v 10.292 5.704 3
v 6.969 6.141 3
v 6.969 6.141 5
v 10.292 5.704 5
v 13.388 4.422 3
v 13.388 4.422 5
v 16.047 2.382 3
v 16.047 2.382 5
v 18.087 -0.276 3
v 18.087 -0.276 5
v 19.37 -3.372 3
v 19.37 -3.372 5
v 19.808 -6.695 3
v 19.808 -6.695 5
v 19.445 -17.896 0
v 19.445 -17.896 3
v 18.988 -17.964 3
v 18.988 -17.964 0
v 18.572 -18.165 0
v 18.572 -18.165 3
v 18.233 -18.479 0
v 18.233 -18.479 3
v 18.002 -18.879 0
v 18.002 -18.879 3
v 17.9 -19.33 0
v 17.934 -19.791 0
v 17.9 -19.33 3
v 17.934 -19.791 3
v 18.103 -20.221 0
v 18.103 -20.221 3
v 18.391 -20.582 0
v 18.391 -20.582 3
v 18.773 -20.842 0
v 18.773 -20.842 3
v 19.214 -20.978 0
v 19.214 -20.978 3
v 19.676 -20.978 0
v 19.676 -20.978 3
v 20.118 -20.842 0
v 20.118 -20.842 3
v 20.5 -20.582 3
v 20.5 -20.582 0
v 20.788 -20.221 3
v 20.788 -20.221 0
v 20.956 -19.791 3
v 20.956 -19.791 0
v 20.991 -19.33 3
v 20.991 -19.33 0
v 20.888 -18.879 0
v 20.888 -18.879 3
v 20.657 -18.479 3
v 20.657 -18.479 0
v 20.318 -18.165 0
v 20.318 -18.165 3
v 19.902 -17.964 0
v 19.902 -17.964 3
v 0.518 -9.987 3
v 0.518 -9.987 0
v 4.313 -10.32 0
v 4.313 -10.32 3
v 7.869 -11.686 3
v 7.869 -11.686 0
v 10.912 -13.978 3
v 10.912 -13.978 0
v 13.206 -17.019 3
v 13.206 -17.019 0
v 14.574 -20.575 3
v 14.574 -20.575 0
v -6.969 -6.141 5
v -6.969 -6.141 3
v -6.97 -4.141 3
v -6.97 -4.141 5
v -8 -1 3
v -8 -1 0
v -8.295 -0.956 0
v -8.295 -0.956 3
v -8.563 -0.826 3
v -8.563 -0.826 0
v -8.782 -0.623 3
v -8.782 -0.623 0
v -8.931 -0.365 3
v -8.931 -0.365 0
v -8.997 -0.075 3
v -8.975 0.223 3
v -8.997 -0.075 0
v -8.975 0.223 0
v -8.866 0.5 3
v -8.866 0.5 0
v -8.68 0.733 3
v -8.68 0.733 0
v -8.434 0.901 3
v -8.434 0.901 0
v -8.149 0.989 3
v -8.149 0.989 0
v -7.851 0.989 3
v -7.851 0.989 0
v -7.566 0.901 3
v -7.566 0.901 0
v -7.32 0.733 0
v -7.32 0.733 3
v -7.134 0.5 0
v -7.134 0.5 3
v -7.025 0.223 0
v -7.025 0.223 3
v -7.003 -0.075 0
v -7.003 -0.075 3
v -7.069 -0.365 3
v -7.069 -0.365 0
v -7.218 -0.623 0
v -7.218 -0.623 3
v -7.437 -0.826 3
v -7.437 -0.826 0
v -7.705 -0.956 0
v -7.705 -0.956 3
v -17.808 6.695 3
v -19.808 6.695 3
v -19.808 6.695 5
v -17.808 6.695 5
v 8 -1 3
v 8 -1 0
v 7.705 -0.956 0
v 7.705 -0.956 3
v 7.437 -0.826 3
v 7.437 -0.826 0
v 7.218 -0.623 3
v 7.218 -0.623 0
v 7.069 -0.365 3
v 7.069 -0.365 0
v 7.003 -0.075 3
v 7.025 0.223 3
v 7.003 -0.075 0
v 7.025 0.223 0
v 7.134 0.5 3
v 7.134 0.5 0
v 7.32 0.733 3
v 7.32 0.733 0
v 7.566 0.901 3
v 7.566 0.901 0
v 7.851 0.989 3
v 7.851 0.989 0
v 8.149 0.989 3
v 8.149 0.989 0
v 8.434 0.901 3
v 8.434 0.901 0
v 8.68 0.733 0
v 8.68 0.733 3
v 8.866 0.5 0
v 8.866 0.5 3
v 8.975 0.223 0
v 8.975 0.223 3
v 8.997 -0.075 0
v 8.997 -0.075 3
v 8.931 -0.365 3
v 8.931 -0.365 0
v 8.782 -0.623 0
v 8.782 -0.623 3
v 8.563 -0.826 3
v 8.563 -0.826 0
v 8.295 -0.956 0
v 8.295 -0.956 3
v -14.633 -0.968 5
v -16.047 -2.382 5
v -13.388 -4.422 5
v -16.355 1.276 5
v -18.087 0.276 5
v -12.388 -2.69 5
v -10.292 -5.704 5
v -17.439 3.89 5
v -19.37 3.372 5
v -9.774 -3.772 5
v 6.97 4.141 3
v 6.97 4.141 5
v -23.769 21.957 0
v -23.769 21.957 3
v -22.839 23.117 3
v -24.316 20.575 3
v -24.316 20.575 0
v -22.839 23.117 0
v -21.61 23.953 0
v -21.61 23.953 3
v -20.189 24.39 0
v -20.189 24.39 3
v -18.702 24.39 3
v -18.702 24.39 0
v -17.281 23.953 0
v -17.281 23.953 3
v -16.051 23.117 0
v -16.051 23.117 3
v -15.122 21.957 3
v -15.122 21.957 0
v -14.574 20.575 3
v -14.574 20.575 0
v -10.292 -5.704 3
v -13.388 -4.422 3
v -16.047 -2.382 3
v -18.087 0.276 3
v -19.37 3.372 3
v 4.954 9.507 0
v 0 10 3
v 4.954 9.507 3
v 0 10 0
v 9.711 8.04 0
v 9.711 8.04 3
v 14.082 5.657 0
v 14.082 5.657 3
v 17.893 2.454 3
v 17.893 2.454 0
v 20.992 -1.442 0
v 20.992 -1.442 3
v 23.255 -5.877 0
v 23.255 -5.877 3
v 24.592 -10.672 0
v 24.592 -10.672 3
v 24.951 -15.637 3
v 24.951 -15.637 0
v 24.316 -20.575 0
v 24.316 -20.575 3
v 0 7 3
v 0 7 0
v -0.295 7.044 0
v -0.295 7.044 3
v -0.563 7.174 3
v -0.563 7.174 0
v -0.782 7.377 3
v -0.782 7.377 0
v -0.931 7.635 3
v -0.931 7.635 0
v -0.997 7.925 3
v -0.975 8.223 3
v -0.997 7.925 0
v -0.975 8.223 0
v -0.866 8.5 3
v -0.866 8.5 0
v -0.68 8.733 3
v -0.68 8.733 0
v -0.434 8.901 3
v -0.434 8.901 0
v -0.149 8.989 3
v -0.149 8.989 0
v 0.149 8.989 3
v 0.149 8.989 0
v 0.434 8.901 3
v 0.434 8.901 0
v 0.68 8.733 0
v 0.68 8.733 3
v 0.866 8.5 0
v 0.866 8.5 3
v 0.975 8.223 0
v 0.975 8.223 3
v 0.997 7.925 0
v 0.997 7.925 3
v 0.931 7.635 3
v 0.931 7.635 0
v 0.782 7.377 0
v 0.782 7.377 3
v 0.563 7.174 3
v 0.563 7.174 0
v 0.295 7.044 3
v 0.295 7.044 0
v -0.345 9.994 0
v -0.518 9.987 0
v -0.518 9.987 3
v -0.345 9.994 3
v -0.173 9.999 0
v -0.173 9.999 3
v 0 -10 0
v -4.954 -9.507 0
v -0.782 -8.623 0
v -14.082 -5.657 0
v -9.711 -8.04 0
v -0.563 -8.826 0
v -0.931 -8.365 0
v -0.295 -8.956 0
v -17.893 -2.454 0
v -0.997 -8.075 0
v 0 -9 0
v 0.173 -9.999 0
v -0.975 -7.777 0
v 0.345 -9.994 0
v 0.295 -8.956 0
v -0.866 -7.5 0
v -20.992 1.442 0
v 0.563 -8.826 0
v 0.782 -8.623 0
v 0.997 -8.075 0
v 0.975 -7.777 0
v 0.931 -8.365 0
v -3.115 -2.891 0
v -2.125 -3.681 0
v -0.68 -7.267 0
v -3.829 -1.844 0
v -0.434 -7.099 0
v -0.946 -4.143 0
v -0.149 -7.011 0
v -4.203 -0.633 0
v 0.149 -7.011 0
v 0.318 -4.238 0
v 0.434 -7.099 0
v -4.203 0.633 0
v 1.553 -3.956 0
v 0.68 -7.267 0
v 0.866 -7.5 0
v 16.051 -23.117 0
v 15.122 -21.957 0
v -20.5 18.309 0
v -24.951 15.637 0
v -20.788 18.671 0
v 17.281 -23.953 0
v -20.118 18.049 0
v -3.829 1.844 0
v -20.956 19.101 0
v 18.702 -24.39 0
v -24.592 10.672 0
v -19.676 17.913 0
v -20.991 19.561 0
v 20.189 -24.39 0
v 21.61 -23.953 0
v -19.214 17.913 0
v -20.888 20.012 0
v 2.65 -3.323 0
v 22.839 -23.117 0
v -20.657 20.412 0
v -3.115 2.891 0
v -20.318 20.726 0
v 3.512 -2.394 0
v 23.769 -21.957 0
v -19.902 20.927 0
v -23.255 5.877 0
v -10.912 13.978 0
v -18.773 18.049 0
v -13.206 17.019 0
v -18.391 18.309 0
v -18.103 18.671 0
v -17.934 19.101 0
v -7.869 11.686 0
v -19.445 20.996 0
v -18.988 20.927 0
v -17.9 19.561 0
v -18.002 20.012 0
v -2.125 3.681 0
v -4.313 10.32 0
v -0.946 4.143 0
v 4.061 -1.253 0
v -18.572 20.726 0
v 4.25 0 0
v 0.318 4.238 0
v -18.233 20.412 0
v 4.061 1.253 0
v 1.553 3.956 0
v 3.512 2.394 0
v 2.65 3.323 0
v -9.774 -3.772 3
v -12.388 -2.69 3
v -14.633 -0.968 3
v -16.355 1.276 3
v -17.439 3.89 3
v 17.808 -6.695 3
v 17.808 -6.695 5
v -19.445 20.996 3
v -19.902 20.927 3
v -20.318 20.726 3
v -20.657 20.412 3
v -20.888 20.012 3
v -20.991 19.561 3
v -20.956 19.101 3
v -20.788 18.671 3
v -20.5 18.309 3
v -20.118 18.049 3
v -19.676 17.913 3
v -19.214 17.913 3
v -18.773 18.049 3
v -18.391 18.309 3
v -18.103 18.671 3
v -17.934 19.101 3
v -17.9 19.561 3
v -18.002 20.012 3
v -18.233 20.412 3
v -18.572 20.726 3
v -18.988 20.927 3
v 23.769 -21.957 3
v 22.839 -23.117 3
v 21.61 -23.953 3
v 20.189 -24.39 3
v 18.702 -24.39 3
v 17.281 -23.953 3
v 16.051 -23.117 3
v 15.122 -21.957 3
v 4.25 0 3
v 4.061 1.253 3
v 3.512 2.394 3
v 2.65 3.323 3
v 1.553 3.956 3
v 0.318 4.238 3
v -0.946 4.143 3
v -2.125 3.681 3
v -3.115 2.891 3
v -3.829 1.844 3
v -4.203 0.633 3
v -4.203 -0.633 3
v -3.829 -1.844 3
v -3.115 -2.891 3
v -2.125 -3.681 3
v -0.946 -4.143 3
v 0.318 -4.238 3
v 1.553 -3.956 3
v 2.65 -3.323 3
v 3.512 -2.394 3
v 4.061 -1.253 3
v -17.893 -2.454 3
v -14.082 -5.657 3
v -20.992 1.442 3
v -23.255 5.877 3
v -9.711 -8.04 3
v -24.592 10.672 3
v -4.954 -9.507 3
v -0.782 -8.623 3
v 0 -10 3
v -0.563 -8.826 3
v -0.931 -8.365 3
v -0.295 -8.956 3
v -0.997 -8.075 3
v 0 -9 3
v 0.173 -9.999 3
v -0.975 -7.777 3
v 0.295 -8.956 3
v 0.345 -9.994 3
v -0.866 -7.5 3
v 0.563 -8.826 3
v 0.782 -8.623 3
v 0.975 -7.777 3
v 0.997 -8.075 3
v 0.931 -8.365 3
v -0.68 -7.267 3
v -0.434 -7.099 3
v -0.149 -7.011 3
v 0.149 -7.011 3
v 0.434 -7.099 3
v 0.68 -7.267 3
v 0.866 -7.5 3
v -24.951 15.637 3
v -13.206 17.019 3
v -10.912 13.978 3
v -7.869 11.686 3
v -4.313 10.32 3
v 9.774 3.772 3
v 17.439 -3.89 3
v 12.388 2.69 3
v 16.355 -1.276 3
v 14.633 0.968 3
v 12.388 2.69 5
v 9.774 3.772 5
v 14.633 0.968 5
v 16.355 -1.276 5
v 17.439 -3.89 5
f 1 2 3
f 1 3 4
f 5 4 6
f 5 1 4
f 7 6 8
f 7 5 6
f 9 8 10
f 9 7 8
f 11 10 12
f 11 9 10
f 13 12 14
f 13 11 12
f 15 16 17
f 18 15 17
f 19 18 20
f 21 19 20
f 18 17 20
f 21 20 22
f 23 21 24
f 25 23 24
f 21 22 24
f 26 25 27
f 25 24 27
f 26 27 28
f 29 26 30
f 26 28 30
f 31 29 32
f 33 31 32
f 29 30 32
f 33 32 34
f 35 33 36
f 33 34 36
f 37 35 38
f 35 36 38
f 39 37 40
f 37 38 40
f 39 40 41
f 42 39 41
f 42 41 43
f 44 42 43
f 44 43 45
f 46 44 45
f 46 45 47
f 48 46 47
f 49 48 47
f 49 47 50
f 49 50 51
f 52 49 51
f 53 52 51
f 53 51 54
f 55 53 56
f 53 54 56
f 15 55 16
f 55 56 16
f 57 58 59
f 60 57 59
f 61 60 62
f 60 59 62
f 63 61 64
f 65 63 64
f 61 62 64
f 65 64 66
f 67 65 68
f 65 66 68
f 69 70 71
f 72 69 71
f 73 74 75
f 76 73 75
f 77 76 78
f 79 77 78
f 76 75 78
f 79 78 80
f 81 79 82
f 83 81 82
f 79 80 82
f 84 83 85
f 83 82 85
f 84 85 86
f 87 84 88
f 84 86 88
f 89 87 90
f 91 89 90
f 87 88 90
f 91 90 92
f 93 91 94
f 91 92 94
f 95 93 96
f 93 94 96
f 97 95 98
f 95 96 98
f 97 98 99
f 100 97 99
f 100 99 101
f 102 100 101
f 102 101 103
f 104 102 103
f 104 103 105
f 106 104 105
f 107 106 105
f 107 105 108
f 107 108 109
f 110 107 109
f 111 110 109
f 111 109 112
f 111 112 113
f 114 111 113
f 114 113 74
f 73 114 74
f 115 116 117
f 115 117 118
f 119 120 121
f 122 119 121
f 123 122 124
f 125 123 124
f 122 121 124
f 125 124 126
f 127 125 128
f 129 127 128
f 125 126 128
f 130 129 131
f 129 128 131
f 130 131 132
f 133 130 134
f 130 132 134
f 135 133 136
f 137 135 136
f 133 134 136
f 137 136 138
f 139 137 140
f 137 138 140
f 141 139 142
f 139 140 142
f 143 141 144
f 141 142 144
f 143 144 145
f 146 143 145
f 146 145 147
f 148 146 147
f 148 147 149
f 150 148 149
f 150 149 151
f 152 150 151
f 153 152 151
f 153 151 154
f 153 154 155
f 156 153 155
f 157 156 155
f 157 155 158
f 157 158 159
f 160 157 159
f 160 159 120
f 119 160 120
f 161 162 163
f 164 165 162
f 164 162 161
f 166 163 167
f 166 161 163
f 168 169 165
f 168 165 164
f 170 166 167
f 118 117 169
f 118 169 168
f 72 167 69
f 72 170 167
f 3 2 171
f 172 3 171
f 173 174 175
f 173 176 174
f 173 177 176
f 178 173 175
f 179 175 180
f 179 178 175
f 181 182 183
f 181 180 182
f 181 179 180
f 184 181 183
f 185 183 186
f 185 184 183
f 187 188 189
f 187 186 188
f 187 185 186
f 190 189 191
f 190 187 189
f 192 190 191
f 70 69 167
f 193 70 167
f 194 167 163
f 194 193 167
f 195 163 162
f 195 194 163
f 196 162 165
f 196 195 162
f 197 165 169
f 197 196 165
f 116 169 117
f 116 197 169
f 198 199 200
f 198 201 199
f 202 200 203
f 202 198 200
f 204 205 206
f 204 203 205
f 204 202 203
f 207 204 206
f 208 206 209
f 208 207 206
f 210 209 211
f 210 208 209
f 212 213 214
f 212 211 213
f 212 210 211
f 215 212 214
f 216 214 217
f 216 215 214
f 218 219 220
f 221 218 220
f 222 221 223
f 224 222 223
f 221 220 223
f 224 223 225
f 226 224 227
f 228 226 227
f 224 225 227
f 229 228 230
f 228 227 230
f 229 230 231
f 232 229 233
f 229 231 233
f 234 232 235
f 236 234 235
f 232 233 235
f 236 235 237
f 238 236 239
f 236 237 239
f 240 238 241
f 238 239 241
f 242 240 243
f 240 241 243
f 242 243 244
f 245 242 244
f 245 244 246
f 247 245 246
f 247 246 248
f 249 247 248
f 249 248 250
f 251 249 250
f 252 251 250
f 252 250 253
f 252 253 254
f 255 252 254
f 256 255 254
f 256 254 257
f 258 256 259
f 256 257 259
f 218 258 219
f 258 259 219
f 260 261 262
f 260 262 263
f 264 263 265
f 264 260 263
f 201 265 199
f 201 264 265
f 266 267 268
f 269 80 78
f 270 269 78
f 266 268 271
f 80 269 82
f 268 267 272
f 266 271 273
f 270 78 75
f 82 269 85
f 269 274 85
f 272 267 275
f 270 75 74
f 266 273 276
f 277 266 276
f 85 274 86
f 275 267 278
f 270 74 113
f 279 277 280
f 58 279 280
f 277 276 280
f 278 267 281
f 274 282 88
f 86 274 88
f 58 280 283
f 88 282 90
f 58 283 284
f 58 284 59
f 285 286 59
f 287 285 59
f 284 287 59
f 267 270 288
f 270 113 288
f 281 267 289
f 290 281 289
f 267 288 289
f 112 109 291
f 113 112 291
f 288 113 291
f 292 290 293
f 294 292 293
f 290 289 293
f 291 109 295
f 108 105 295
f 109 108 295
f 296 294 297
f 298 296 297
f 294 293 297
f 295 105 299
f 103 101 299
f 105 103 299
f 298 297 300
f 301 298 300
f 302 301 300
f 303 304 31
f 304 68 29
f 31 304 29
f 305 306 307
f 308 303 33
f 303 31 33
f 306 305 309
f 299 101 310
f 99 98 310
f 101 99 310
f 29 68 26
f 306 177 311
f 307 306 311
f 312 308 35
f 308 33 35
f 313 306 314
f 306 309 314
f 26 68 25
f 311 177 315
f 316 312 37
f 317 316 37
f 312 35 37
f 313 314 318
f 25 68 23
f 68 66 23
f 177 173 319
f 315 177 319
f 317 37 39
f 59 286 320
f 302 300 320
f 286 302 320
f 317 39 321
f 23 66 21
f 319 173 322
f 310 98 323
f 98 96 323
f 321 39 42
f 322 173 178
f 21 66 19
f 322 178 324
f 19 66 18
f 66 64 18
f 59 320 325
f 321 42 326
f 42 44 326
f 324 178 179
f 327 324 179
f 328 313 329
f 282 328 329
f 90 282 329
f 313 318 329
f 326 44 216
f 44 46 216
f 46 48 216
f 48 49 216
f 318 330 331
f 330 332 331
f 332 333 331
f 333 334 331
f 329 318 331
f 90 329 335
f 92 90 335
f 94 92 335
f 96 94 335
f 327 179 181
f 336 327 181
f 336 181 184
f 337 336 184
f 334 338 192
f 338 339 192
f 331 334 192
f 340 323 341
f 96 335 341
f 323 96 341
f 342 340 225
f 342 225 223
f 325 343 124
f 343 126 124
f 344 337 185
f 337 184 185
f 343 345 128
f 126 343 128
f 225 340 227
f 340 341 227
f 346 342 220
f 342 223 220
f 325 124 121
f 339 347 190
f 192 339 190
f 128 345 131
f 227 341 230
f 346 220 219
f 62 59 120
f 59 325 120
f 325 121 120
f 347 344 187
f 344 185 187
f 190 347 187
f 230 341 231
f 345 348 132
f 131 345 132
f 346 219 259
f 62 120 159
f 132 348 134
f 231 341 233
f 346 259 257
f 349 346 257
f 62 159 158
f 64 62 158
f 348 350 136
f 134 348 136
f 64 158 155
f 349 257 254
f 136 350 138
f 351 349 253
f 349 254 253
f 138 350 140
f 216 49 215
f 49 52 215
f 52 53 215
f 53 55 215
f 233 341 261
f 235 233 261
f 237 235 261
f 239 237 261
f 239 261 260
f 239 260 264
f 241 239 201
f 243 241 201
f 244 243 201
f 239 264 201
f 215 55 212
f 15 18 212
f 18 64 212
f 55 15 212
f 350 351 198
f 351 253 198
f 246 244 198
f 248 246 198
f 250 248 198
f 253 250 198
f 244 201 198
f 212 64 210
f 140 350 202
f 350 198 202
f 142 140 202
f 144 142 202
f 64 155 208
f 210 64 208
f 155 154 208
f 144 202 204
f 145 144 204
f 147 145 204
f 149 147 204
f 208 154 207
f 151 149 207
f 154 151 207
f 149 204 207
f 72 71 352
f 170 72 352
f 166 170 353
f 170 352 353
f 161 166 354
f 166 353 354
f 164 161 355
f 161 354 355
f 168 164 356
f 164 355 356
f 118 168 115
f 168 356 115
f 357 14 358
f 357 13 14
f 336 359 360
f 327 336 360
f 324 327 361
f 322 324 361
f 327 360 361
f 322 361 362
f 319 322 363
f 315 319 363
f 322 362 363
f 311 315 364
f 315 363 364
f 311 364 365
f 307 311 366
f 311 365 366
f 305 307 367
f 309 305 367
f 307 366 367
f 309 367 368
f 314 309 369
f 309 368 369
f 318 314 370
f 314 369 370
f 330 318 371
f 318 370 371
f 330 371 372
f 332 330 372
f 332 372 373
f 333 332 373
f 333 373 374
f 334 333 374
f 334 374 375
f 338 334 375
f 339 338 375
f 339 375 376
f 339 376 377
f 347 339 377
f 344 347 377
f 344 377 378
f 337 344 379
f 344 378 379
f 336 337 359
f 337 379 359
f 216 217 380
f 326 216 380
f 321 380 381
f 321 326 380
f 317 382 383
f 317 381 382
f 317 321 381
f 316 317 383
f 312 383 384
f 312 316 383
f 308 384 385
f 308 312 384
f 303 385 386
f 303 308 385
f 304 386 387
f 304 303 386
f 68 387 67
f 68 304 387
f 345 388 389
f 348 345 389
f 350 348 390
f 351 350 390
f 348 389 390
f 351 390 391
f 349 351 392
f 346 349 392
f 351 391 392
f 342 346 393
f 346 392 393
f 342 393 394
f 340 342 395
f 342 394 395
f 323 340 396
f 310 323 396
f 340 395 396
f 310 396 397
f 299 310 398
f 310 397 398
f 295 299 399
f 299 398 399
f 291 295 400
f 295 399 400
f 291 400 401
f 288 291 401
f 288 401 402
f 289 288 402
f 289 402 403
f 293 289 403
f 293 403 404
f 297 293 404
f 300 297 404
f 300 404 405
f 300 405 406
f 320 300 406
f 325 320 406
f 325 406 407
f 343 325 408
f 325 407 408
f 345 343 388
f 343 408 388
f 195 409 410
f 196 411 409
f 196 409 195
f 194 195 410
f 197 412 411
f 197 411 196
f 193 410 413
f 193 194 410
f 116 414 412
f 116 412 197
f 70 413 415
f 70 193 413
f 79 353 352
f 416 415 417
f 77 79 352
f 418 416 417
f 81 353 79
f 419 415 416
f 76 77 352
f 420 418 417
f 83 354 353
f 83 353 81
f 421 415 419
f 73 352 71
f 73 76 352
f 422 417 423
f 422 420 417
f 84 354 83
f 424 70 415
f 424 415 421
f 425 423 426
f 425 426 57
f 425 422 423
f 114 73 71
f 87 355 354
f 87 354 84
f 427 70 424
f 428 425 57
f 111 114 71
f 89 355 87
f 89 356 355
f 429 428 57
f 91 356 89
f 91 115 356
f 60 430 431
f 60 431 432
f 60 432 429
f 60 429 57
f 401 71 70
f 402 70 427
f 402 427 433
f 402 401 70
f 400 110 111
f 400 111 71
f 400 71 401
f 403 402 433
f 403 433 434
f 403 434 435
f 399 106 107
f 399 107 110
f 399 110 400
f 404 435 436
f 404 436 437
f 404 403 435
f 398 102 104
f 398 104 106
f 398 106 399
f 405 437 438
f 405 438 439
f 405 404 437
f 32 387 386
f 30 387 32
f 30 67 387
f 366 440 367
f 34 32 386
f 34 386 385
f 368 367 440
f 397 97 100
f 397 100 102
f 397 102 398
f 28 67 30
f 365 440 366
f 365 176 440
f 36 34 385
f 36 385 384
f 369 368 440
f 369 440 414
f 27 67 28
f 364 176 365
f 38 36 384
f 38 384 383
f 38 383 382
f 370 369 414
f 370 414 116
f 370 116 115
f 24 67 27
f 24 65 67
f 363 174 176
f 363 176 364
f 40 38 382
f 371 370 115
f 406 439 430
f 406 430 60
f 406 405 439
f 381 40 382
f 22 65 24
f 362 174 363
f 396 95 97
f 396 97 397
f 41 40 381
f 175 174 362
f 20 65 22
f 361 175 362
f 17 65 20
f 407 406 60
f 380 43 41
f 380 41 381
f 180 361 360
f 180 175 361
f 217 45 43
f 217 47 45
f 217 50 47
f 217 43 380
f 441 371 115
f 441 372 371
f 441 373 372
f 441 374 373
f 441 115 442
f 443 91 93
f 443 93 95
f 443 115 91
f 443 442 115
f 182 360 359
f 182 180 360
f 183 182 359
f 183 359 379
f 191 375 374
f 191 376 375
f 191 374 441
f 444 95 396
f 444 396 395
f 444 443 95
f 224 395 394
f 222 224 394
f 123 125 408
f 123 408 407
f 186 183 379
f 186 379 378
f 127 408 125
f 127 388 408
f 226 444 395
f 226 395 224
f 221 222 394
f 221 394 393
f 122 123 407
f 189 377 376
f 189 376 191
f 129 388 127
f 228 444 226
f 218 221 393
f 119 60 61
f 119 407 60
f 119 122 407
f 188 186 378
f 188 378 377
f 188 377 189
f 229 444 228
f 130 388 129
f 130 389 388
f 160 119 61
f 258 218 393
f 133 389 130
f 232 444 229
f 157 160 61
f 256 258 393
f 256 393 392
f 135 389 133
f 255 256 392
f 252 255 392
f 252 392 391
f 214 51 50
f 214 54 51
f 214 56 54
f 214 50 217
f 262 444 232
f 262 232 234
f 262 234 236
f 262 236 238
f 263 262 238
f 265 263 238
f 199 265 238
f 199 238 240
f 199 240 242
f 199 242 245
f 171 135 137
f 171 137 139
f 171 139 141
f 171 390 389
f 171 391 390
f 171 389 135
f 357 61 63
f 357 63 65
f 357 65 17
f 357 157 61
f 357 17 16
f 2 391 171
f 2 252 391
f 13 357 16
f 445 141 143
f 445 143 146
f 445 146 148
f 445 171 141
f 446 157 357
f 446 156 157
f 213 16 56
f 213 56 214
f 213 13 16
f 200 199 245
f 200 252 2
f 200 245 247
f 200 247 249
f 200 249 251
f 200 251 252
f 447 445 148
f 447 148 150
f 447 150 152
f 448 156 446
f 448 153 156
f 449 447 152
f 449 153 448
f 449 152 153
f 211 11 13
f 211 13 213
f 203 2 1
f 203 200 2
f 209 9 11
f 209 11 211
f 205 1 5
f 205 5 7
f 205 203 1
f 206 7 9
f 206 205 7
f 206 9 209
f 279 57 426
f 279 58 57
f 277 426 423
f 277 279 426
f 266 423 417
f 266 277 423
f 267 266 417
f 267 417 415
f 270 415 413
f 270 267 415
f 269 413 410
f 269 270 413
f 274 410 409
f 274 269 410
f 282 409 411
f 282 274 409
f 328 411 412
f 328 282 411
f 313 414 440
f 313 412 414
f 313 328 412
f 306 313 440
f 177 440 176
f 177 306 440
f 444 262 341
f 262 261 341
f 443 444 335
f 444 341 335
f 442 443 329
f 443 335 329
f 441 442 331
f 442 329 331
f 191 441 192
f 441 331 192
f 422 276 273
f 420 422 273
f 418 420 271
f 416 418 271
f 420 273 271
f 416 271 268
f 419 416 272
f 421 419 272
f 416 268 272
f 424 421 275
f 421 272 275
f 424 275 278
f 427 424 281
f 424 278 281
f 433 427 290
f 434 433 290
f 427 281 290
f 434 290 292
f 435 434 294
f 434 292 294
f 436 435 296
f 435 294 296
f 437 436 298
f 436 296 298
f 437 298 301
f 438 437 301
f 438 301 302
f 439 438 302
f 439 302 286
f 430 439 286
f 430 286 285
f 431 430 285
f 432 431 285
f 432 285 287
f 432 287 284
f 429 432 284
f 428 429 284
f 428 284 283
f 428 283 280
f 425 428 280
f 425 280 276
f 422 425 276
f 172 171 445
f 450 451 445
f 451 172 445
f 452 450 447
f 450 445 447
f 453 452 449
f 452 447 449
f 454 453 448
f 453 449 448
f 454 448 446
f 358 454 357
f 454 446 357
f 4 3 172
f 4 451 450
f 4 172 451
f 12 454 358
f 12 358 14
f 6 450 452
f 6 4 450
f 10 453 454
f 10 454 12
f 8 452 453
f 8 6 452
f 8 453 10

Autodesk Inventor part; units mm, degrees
ref_plane "YZ Plane" through (0, 0, 0) normal (1, 0, 0) x (0, 1, 0)
ref_plane "XZ Plane" through (0, 0, 0) normal (0, 1, 0) x (-1, 0, 0)
ref_plane "XY Plane" through (0, 0, 0) normal (0, 0, 1) x (1, 0, 0)
sketch "スケッチ1" plane through (0, 0, 0) normal (0, 0, 1) x (1, 0, 0)
  circle A0 centre (0, 0) radius 27.5
  line L0 (0, 27.5) -> (0, 0)
  line L1 (8, 0) -> (19.445271, -19.445602)
  line L2 (0, 0) -> (27.5, 0)
  circle A1 centre (19.445271, -19.445602) radius 5
  circle A2 centre (0, 0) radius 10
  arc A3 (24.316088, -20.574825) -> (0, 10.000005) centre (0.018653, -14.941839) ccw
  line L3 (24.316088, -20.574825) -> (14.574455, -20.574825)
  arc A4 (14.574455, -20.574825) -> (0.517924, -9.986579) centre (1.227526, -23.669106) ccw
  arc A5 (-24.316088, 20.574825) -> (0, -10.000005) centre (-0.018653, 14.941839) ccw
  arc A6 (-14.574455, 20.574825) -> (-0.517924, 9.986579) centre (-1.227526, 23.669106) ccw
  circle A7 centre (-19.445271, 19.445602) radius 5
  point P0 (-0.517924, 9.986579)
  point P1 (0, -10)
  point P2 (0, 10.000005)
  dimension "d4" = 20
  dimension "d0" = 55
  dimension "d1" = 8
  dimension "d2" = 22.56381
  dimension "d3" = 10
  dimension "d5" = 9.74163
  dimension "d9" = 360
sketch "スケッチ1 outline for 押し出し1" plane through (0, 0, 0) normal (0, 0, 1) x (1, 0, 0)
  arc A0 (14.574455, -20.574825) -> (24.316088, -20.574825) centre (19.445271, -19.445602) ccw
  arc A1 (24.316088, -20.574825) -> (0, 10.000005) centre (0.018653, -14.941839) ccw
  arc A2 (0, 10) -> (-0.517924, 9.986579) centre (0, 0) ccw
  arc A3 (-0.517924, 9.986579) -> (-14.574455, 20.574825) centre (-1.227526, 23.669106) cw
  arc A4 (-14.574455, 20.574825) -> (-24.316088, 20.574825) centre (-19.445271, 19.445602) ccw
  arc A5 (-24.316088, 20.574825) -> (0, -10) centre (-0.018659, 14.941837) ccw
  arc A6 (0, -10) -> (0.517924, -9.986579) centre (0, 0) ccw
  arc A7 (0.517924, -9.986579) -> (14.574455, -20.574825) centre (1.227526, -23.669106) cw
extrude "押し出し1" add sketch "スケッチ1 outline for 押し出し1" along normal blind 3
sketch "スケッチ2" plane through (0, 0, 3) normal (0, 0, 1) x (1, 0, 0)
  circle A0 centre (0, 0) radius 4.25
  dimension "d13" = 8.5
extrude "押し出し2" cut sketch "スケッチ2" against normal blind 3
sketch "スケッチ3" plane through (0, 0, 3) normal (0, 0, 1) x (1, 0, 0)
  arc A0 (-14.574455, 20.574825) -> (-24.316088, 20.574825) centre (-19.445271, 19.445602) ccw
  arc A1 (14.574455, -20.574825) -> (24.316088, -20.574825) centre (19.445271, -19.445602) ccw
  circle A2 centre (0, 0) radius 4.25
  point P0 (8, 0)
  point P1 (-8, 0)
  point P2 (0, 8)
  point P3 (-8, 0)
  point P4 (0, -8)
  dimension "d16" = 8
  dimension "d17" = 8
  dimension "d49" = 360
hole "穴1" at (-19.445271, 19.445602, 3) at (19.445271, -19.445602, 3) at (8, 0, 3) at (-8, 0, 3) at (0, 8, 3) at (0, -8, 3) direction (0, 0, -1) diameter 2 end through all
sketch "スケッチ4" plane through (0, 0, 3) normal (0, 0, 1) x (1, 0, 0)
  circle A0 centre (0, 0) radius 9.289
  circle A1 centre (8, 0) radius 1
  circle A2 centre (8, 0) radius 6.227
  circle A3 centre (0, 0) radius 8.107
  circle A4 centre (8, 0) radius 4.267399
  line L0 (6.969375, 6.141119) -> (6.969547, 4.141119)
  circle A5 centre (6.970301, -6.696881) radius 12.838
  circle A6 centre (0, 0) radius 20.909
  circle A7 centre (8, 0) radius 13.574
  line L1 (19.8083, -6.694589) -> (17.8083, -6.694761)
  arc A8 (17.8083, -6.694761) -> (6.969547, 4.141119) centre (6.970301, -6.696881) ccw
  circle A9 centre (-6.970301, 6.696881) radius 12.838
  line L2 (-19.8083, 6.694589) -> (-17.8083, 6.694761)
  arc A10 (-17.8083, 6.694761) -> (-6.969547, -4.141119) centre (-6.970301, 6.696881) ccw
  line L3 (-6.969375, -6.141119) -> (-6.969547, -4.141119)
  point P0 (6.969547, 4.141119)
  point P1 (-6.969547, -4.141119)
  dimension "d25" = 18.578
  dimension "d26" = 12.454
  dimension "d30" = 41.818
  dimension "d31" = 27.148
  dimension "d27" = 16.214
  dimension "d29" = 25.676
  dimension "d32" = 2
  dimension "d33" = 2
  dimension "d36" = 360
extrude "押し出し3" add sketch "スケッチ4" along normal blind 2 contours A8 A4 A0 | A0 A4 A8 | A4 L0 A0 | A0 A5 A2 A8 A4 | A2 A5 L1 A8 | A9 L2 A10 A0 | A0 A10 L3 picked at (7.717949, 4.165451) picked at (9.179473, 4.022297)
sketch "スケッチ5" plane through (0, 0, 0) normal (0, 0, -1) x (-1, 0, 0)
  circle A0 centre (19.445271, 19.445602) radius 1
  circle A1 centre (-19.445271, -19.445602) radius 1
  point P0 (0, 0)
hole "穴2" at (-19.445271, 19.445602, 0) at (19.445271, -19.445602, 0) direction (0, 0, 1) diameter 3.1 end through all
properties part number "rotor" material "アルミニウム 6061"
